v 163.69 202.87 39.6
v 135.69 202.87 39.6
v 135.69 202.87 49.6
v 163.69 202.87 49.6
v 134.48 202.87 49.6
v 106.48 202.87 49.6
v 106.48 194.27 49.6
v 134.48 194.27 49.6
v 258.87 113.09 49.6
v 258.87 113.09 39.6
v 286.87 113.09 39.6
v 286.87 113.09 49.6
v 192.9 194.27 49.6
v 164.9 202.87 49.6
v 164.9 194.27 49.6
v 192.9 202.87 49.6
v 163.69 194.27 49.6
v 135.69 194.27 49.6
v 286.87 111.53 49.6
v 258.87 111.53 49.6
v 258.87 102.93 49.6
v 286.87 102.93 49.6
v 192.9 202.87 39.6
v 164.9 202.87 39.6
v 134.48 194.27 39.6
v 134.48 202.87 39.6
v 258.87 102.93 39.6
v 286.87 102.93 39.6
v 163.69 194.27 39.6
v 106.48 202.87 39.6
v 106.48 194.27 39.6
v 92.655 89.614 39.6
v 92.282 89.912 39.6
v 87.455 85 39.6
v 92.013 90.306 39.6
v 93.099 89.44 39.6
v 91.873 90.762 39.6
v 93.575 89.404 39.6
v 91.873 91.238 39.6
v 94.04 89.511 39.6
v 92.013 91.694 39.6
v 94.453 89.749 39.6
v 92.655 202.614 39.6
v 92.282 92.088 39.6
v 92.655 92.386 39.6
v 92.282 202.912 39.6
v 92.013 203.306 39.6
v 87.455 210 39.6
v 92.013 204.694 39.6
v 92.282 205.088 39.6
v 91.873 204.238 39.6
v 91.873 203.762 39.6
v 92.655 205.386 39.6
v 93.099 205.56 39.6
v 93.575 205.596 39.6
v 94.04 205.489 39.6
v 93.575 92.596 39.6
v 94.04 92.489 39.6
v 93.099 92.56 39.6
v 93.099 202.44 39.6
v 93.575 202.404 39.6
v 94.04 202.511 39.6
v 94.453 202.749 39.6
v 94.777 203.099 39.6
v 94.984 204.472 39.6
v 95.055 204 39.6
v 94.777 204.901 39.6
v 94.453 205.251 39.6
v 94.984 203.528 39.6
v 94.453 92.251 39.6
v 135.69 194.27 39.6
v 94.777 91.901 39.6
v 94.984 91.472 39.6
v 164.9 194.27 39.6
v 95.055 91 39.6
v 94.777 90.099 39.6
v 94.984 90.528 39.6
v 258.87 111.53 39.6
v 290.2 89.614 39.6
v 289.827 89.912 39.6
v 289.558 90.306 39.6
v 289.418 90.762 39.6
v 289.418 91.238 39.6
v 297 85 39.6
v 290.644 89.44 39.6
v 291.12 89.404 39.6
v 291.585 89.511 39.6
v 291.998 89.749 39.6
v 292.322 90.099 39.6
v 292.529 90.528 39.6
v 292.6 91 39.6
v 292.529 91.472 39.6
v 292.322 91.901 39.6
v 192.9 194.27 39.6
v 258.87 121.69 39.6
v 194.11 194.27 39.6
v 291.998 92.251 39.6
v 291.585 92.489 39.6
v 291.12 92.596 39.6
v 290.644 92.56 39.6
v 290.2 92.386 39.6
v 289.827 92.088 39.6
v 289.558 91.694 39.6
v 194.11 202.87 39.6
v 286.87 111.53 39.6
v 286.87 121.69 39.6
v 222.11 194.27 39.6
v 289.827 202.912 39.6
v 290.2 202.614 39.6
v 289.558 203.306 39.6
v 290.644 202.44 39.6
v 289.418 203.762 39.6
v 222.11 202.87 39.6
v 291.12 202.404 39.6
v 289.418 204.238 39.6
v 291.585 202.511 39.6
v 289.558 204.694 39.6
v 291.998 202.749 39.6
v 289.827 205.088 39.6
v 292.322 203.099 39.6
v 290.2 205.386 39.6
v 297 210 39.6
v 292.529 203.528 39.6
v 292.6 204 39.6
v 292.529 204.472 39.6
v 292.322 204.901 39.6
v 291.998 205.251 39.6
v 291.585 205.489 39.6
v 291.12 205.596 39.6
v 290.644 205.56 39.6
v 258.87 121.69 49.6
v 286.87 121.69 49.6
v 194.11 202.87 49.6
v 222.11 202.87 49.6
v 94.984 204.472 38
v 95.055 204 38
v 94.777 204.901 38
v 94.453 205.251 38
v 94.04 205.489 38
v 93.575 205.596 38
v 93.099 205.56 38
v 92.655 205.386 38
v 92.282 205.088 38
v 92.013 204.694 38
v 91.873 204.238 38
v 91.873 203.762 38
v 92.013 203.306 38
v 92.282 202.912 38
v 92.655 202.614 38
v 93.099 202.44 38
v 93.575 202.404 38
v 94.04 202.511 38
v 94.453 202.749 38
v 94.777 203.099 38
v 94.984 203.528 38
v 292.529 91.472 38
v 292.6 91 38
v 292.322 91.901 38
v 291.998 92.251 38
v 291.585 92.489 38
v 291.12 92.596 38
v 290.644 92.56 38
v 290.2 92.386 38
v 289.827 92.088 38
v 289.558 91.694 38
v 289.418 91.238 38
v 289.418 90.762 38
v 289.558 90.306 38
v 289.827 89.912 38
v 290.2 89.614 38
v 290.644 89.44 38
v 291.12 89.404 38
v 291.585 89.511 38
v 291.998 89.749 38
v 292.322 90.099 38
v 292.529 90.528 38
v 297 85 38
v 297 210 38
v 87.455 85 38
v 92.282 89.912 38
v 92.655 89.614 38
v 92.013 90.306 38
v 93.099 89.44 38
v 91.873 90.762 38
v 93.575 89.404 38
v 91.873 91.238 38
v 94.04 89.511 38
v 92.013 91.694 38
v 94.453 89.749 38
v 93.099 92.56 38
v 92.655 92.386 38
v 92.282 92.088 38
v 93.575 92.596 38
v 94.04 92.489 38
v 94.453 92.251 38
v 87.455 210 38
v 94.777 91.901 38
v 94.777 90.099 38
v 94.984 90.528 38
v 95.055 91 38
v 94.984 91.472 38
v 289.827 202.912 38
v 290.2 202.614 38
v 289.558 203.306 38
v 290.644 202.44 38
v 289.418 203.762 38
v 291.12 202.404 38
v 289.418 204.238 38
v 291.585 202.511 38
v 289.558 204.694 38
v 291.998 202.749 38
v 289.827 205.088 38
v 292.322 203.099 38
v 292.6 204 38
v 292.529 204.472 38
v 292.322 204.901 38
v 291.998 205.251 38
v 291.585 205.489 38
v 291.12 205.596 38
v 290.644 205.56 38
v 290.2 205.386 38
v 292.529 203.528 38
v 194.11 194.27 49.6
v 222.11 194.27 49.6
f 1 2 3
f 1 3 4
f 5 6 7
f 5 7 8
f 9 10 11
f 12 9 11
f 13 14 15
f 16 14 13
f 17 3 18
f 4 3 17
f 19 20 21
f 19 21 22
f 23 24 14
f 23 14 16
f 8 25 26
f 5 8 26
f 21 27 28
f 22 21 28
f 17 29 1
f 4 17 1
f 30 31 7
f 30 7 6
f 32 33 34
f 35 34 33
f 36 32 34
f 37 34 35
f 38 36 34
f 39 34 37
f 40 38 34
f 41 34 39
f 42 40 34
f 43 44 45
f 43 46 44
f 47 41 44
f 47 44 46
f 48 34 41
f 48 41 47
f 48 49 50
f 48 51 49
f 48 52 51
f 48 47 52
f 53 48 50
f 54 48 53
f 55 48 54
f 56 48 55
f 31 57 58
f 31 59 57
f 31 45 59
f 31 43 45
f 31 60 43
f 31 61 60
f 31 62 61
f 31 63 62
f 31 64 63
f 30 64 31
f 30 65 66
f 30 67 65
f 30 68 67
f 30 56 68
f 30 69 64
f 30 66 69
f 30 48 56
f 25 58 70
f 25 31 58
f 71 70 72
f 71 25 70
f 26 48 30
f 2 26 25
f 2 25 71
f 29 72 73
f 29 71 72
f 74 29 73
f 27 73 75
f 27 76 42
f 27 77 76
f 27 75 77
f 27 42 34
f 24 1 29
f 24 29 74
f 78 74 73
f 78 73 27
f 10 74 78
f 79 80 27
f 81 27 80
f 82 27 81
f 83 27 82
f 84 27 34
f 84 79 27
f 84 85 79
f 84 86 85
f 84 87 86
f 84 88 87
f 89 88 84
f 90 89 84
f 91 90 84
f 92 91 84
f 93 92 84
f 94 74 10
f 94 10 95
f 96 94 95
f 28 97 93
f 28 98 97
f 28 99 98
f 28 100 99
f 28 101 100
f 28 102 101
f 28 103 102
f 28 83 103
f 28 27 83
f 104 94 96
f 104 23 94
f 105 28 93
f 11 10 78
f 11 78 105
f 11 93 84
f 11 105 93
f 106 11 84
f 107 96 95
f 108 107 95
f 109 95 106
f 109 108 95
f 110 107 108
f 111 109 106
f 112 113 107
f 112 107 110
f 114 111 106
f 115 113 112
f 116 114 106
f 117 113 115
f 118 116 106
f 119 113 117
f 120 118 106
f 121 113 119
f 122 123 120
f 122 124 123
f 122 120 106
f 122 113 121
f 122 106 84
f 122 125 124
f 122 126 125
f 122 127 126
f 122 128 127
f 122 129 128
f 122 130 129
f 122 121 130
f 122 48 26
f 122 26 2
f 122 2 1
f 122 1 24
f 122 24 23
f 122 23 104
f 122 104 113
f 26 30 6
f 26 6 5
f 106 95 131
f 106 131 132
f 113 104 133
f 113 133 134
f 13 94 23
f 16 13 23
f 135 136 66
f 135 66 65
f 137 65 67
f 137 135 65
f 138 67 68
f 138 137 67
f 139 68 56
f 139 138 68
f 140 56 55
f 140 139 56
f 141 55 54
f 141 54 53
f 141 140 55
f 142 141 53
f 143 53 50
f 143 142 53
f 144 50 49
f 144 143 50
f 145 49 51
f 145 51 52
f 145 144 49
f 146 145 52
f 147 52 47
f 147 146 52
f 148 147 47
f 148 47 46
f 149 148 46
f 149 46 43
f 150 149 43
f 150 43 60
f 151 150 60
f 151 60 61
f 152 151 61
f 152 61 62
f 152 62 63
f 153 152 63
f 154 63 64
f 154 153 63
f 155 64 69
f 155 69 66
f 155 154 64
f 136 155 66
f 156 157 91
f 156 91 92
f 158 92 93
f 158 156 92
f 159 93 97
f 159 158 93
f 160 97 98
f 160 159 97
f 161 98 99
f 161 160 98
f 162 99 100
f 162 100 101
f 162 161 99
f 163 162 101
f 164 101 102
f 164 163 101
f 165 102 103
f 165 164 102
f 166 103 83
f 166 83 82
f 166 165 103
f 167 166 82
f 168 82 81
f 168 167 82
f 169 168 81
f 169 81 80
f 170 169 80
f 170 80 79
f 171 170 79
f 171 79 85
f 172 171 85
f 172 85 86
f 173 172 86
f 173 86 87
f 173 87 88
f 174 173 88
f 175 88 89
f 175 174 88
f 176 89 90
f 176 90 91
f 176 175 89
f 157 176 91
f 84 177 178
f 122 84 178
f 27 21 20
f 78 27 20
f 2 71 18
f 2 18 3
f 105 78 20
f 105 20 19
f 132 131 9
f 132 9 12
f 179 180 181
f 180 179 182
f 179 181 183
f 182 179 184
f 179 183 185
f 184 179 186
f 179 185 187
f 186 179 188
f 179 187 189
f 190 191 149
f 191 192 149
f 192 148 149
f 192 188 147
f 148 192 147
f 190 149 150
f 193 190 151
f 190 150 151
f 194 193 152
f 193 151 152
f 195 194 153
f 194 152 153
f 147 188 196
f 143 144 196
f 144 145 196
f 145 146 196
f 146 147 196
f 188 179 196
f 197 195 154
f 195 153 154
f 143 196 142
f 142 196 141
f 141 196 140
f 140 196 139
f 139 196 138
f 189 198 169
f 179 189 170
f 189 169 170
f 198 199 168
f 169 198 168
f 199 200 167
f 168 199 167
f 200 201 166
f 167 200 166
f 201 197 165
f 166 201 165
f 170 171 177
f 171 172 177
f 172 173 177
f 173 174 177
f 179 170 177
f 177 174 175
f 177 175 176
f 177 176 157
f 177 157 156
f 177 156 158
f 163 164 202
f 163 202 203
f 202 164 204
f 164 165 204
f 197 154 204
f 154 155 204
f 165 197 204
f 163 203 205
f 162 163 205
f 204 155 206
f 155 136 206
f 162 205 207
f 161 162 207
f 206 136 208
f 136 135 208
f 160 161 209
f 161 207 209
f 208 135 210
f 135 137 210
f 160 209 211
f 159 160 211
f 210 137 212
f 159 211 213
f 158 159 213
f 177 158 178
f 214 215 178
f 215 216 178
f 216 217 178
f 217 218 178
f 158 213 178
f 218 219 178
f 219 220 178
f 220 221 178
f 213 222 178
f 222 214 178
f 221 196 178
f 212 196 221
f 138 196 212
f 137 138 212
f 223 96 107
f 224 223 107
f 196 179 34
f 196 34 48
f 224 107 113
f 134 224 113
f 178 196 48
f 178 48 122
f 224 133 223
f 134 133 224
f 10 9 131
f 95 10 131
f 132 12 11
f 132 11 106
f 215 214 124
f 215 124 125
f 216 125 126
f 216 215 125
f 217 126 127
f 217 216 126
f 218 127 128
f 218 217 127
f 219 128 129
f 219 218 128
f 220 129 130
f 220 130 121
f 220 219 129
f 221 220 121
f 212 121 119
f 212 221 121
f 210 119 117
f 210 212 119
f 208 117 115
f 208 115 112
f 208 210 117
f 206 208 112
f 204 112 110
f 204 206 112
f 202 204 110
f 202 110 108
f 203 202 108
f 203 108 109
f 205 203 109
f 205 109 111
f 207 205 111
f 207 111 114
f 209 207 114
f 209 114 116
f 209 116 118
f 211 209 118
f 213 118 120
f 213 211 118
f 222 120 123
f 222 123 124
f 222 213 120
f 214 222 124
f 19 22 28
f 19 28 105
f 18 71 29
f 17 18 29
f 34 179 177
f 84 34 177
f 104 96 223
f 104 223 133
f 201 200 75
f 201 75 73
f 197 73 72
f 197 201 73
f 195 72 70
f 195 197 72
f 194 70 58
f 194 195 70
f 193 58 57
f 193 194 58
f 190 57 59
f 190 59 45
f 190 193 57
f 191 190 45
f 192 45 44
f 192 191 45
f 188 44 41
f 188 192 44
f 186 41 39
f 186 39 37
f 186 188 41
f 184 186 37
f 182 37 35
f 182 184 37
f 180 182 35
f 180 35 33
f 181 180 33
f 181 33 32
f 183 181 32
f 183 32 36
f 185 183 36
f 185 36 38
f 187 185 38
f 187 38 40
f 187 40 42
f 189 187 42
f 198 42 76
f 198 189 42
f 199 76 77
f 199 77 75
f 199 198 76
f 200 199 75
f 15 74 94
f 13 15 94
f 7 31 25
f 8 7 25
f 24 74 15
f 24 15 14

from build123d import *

# Parameters (mm, degrees)
SKETCH010_W      = 209.545
SKETCH010_H      = 125
SKETCH010_R      = 1.6
EXTRUDE010_DEPTH = 1.6
SKETCH015_W      = 28
SKETCH015_H      = 8.6
EXTRUDE014_DEPTH = 10


with BuildPart() as extrude010:
    # Sketch010 → Extrude010 (new body)
    with BuildSketch(Plane.XY.offset(38)):
        with Locations((192.2275, 147.5)):
            Rectangle(SKETCH010_W, SKETCH010_H)
        with Locations((93.455, 204)):
            Circle(SKETCH010_R, mode=Mode.SUBTRACT)
        with Locations((291, 204)):
            Circle(SKETCH010_R, mode=Mode.SUBTRACT)
        with Locations((291, 91)):
            Circle(SKETCH010_R, mode=Mode.SUBTRACT)
        with Locations((93.455, 91)):
            Circle(SKETCH010_R, mode=Mode.SUBTRACT)
    extrude(amount=EXTRUDE010_DEPTH)


with BuildPart() as rf16:
    # Sketch015 (on Face10 of Extrude010) → Extrude014 (new body)
    with BuildSketch(Plane.XY.offset(39.6)):
        with Locations((272.87, 107.23)):
            Rectangle(SKETCH015_W, SKETCH015_H)
        with Locations((272.87, 117.39)):
            Rectangle(SKETCH015_W, SKETCH015_H)
        with Locations((208.11, 198.57)):
            Rectangle(SKETCH015_W, SKETCH015_H)
        with Locations((178.9, 198.57)):
            Rectangle(SKETCH015_W, SKETCH015_H)
        with Locations((149.69, 198.57)):
            Rectangle(SKETCH015_W, SKETCH015_H)
        with Locations((120.48, 198.57)):
            Rectangle(SKETCH015_W, SKETCH015_H)
    extrude(amount=EXTRUDE014_DEPTH)

    # Fusion005: union Extrude010
    add(extrude010.part)


solid = rf16.part
